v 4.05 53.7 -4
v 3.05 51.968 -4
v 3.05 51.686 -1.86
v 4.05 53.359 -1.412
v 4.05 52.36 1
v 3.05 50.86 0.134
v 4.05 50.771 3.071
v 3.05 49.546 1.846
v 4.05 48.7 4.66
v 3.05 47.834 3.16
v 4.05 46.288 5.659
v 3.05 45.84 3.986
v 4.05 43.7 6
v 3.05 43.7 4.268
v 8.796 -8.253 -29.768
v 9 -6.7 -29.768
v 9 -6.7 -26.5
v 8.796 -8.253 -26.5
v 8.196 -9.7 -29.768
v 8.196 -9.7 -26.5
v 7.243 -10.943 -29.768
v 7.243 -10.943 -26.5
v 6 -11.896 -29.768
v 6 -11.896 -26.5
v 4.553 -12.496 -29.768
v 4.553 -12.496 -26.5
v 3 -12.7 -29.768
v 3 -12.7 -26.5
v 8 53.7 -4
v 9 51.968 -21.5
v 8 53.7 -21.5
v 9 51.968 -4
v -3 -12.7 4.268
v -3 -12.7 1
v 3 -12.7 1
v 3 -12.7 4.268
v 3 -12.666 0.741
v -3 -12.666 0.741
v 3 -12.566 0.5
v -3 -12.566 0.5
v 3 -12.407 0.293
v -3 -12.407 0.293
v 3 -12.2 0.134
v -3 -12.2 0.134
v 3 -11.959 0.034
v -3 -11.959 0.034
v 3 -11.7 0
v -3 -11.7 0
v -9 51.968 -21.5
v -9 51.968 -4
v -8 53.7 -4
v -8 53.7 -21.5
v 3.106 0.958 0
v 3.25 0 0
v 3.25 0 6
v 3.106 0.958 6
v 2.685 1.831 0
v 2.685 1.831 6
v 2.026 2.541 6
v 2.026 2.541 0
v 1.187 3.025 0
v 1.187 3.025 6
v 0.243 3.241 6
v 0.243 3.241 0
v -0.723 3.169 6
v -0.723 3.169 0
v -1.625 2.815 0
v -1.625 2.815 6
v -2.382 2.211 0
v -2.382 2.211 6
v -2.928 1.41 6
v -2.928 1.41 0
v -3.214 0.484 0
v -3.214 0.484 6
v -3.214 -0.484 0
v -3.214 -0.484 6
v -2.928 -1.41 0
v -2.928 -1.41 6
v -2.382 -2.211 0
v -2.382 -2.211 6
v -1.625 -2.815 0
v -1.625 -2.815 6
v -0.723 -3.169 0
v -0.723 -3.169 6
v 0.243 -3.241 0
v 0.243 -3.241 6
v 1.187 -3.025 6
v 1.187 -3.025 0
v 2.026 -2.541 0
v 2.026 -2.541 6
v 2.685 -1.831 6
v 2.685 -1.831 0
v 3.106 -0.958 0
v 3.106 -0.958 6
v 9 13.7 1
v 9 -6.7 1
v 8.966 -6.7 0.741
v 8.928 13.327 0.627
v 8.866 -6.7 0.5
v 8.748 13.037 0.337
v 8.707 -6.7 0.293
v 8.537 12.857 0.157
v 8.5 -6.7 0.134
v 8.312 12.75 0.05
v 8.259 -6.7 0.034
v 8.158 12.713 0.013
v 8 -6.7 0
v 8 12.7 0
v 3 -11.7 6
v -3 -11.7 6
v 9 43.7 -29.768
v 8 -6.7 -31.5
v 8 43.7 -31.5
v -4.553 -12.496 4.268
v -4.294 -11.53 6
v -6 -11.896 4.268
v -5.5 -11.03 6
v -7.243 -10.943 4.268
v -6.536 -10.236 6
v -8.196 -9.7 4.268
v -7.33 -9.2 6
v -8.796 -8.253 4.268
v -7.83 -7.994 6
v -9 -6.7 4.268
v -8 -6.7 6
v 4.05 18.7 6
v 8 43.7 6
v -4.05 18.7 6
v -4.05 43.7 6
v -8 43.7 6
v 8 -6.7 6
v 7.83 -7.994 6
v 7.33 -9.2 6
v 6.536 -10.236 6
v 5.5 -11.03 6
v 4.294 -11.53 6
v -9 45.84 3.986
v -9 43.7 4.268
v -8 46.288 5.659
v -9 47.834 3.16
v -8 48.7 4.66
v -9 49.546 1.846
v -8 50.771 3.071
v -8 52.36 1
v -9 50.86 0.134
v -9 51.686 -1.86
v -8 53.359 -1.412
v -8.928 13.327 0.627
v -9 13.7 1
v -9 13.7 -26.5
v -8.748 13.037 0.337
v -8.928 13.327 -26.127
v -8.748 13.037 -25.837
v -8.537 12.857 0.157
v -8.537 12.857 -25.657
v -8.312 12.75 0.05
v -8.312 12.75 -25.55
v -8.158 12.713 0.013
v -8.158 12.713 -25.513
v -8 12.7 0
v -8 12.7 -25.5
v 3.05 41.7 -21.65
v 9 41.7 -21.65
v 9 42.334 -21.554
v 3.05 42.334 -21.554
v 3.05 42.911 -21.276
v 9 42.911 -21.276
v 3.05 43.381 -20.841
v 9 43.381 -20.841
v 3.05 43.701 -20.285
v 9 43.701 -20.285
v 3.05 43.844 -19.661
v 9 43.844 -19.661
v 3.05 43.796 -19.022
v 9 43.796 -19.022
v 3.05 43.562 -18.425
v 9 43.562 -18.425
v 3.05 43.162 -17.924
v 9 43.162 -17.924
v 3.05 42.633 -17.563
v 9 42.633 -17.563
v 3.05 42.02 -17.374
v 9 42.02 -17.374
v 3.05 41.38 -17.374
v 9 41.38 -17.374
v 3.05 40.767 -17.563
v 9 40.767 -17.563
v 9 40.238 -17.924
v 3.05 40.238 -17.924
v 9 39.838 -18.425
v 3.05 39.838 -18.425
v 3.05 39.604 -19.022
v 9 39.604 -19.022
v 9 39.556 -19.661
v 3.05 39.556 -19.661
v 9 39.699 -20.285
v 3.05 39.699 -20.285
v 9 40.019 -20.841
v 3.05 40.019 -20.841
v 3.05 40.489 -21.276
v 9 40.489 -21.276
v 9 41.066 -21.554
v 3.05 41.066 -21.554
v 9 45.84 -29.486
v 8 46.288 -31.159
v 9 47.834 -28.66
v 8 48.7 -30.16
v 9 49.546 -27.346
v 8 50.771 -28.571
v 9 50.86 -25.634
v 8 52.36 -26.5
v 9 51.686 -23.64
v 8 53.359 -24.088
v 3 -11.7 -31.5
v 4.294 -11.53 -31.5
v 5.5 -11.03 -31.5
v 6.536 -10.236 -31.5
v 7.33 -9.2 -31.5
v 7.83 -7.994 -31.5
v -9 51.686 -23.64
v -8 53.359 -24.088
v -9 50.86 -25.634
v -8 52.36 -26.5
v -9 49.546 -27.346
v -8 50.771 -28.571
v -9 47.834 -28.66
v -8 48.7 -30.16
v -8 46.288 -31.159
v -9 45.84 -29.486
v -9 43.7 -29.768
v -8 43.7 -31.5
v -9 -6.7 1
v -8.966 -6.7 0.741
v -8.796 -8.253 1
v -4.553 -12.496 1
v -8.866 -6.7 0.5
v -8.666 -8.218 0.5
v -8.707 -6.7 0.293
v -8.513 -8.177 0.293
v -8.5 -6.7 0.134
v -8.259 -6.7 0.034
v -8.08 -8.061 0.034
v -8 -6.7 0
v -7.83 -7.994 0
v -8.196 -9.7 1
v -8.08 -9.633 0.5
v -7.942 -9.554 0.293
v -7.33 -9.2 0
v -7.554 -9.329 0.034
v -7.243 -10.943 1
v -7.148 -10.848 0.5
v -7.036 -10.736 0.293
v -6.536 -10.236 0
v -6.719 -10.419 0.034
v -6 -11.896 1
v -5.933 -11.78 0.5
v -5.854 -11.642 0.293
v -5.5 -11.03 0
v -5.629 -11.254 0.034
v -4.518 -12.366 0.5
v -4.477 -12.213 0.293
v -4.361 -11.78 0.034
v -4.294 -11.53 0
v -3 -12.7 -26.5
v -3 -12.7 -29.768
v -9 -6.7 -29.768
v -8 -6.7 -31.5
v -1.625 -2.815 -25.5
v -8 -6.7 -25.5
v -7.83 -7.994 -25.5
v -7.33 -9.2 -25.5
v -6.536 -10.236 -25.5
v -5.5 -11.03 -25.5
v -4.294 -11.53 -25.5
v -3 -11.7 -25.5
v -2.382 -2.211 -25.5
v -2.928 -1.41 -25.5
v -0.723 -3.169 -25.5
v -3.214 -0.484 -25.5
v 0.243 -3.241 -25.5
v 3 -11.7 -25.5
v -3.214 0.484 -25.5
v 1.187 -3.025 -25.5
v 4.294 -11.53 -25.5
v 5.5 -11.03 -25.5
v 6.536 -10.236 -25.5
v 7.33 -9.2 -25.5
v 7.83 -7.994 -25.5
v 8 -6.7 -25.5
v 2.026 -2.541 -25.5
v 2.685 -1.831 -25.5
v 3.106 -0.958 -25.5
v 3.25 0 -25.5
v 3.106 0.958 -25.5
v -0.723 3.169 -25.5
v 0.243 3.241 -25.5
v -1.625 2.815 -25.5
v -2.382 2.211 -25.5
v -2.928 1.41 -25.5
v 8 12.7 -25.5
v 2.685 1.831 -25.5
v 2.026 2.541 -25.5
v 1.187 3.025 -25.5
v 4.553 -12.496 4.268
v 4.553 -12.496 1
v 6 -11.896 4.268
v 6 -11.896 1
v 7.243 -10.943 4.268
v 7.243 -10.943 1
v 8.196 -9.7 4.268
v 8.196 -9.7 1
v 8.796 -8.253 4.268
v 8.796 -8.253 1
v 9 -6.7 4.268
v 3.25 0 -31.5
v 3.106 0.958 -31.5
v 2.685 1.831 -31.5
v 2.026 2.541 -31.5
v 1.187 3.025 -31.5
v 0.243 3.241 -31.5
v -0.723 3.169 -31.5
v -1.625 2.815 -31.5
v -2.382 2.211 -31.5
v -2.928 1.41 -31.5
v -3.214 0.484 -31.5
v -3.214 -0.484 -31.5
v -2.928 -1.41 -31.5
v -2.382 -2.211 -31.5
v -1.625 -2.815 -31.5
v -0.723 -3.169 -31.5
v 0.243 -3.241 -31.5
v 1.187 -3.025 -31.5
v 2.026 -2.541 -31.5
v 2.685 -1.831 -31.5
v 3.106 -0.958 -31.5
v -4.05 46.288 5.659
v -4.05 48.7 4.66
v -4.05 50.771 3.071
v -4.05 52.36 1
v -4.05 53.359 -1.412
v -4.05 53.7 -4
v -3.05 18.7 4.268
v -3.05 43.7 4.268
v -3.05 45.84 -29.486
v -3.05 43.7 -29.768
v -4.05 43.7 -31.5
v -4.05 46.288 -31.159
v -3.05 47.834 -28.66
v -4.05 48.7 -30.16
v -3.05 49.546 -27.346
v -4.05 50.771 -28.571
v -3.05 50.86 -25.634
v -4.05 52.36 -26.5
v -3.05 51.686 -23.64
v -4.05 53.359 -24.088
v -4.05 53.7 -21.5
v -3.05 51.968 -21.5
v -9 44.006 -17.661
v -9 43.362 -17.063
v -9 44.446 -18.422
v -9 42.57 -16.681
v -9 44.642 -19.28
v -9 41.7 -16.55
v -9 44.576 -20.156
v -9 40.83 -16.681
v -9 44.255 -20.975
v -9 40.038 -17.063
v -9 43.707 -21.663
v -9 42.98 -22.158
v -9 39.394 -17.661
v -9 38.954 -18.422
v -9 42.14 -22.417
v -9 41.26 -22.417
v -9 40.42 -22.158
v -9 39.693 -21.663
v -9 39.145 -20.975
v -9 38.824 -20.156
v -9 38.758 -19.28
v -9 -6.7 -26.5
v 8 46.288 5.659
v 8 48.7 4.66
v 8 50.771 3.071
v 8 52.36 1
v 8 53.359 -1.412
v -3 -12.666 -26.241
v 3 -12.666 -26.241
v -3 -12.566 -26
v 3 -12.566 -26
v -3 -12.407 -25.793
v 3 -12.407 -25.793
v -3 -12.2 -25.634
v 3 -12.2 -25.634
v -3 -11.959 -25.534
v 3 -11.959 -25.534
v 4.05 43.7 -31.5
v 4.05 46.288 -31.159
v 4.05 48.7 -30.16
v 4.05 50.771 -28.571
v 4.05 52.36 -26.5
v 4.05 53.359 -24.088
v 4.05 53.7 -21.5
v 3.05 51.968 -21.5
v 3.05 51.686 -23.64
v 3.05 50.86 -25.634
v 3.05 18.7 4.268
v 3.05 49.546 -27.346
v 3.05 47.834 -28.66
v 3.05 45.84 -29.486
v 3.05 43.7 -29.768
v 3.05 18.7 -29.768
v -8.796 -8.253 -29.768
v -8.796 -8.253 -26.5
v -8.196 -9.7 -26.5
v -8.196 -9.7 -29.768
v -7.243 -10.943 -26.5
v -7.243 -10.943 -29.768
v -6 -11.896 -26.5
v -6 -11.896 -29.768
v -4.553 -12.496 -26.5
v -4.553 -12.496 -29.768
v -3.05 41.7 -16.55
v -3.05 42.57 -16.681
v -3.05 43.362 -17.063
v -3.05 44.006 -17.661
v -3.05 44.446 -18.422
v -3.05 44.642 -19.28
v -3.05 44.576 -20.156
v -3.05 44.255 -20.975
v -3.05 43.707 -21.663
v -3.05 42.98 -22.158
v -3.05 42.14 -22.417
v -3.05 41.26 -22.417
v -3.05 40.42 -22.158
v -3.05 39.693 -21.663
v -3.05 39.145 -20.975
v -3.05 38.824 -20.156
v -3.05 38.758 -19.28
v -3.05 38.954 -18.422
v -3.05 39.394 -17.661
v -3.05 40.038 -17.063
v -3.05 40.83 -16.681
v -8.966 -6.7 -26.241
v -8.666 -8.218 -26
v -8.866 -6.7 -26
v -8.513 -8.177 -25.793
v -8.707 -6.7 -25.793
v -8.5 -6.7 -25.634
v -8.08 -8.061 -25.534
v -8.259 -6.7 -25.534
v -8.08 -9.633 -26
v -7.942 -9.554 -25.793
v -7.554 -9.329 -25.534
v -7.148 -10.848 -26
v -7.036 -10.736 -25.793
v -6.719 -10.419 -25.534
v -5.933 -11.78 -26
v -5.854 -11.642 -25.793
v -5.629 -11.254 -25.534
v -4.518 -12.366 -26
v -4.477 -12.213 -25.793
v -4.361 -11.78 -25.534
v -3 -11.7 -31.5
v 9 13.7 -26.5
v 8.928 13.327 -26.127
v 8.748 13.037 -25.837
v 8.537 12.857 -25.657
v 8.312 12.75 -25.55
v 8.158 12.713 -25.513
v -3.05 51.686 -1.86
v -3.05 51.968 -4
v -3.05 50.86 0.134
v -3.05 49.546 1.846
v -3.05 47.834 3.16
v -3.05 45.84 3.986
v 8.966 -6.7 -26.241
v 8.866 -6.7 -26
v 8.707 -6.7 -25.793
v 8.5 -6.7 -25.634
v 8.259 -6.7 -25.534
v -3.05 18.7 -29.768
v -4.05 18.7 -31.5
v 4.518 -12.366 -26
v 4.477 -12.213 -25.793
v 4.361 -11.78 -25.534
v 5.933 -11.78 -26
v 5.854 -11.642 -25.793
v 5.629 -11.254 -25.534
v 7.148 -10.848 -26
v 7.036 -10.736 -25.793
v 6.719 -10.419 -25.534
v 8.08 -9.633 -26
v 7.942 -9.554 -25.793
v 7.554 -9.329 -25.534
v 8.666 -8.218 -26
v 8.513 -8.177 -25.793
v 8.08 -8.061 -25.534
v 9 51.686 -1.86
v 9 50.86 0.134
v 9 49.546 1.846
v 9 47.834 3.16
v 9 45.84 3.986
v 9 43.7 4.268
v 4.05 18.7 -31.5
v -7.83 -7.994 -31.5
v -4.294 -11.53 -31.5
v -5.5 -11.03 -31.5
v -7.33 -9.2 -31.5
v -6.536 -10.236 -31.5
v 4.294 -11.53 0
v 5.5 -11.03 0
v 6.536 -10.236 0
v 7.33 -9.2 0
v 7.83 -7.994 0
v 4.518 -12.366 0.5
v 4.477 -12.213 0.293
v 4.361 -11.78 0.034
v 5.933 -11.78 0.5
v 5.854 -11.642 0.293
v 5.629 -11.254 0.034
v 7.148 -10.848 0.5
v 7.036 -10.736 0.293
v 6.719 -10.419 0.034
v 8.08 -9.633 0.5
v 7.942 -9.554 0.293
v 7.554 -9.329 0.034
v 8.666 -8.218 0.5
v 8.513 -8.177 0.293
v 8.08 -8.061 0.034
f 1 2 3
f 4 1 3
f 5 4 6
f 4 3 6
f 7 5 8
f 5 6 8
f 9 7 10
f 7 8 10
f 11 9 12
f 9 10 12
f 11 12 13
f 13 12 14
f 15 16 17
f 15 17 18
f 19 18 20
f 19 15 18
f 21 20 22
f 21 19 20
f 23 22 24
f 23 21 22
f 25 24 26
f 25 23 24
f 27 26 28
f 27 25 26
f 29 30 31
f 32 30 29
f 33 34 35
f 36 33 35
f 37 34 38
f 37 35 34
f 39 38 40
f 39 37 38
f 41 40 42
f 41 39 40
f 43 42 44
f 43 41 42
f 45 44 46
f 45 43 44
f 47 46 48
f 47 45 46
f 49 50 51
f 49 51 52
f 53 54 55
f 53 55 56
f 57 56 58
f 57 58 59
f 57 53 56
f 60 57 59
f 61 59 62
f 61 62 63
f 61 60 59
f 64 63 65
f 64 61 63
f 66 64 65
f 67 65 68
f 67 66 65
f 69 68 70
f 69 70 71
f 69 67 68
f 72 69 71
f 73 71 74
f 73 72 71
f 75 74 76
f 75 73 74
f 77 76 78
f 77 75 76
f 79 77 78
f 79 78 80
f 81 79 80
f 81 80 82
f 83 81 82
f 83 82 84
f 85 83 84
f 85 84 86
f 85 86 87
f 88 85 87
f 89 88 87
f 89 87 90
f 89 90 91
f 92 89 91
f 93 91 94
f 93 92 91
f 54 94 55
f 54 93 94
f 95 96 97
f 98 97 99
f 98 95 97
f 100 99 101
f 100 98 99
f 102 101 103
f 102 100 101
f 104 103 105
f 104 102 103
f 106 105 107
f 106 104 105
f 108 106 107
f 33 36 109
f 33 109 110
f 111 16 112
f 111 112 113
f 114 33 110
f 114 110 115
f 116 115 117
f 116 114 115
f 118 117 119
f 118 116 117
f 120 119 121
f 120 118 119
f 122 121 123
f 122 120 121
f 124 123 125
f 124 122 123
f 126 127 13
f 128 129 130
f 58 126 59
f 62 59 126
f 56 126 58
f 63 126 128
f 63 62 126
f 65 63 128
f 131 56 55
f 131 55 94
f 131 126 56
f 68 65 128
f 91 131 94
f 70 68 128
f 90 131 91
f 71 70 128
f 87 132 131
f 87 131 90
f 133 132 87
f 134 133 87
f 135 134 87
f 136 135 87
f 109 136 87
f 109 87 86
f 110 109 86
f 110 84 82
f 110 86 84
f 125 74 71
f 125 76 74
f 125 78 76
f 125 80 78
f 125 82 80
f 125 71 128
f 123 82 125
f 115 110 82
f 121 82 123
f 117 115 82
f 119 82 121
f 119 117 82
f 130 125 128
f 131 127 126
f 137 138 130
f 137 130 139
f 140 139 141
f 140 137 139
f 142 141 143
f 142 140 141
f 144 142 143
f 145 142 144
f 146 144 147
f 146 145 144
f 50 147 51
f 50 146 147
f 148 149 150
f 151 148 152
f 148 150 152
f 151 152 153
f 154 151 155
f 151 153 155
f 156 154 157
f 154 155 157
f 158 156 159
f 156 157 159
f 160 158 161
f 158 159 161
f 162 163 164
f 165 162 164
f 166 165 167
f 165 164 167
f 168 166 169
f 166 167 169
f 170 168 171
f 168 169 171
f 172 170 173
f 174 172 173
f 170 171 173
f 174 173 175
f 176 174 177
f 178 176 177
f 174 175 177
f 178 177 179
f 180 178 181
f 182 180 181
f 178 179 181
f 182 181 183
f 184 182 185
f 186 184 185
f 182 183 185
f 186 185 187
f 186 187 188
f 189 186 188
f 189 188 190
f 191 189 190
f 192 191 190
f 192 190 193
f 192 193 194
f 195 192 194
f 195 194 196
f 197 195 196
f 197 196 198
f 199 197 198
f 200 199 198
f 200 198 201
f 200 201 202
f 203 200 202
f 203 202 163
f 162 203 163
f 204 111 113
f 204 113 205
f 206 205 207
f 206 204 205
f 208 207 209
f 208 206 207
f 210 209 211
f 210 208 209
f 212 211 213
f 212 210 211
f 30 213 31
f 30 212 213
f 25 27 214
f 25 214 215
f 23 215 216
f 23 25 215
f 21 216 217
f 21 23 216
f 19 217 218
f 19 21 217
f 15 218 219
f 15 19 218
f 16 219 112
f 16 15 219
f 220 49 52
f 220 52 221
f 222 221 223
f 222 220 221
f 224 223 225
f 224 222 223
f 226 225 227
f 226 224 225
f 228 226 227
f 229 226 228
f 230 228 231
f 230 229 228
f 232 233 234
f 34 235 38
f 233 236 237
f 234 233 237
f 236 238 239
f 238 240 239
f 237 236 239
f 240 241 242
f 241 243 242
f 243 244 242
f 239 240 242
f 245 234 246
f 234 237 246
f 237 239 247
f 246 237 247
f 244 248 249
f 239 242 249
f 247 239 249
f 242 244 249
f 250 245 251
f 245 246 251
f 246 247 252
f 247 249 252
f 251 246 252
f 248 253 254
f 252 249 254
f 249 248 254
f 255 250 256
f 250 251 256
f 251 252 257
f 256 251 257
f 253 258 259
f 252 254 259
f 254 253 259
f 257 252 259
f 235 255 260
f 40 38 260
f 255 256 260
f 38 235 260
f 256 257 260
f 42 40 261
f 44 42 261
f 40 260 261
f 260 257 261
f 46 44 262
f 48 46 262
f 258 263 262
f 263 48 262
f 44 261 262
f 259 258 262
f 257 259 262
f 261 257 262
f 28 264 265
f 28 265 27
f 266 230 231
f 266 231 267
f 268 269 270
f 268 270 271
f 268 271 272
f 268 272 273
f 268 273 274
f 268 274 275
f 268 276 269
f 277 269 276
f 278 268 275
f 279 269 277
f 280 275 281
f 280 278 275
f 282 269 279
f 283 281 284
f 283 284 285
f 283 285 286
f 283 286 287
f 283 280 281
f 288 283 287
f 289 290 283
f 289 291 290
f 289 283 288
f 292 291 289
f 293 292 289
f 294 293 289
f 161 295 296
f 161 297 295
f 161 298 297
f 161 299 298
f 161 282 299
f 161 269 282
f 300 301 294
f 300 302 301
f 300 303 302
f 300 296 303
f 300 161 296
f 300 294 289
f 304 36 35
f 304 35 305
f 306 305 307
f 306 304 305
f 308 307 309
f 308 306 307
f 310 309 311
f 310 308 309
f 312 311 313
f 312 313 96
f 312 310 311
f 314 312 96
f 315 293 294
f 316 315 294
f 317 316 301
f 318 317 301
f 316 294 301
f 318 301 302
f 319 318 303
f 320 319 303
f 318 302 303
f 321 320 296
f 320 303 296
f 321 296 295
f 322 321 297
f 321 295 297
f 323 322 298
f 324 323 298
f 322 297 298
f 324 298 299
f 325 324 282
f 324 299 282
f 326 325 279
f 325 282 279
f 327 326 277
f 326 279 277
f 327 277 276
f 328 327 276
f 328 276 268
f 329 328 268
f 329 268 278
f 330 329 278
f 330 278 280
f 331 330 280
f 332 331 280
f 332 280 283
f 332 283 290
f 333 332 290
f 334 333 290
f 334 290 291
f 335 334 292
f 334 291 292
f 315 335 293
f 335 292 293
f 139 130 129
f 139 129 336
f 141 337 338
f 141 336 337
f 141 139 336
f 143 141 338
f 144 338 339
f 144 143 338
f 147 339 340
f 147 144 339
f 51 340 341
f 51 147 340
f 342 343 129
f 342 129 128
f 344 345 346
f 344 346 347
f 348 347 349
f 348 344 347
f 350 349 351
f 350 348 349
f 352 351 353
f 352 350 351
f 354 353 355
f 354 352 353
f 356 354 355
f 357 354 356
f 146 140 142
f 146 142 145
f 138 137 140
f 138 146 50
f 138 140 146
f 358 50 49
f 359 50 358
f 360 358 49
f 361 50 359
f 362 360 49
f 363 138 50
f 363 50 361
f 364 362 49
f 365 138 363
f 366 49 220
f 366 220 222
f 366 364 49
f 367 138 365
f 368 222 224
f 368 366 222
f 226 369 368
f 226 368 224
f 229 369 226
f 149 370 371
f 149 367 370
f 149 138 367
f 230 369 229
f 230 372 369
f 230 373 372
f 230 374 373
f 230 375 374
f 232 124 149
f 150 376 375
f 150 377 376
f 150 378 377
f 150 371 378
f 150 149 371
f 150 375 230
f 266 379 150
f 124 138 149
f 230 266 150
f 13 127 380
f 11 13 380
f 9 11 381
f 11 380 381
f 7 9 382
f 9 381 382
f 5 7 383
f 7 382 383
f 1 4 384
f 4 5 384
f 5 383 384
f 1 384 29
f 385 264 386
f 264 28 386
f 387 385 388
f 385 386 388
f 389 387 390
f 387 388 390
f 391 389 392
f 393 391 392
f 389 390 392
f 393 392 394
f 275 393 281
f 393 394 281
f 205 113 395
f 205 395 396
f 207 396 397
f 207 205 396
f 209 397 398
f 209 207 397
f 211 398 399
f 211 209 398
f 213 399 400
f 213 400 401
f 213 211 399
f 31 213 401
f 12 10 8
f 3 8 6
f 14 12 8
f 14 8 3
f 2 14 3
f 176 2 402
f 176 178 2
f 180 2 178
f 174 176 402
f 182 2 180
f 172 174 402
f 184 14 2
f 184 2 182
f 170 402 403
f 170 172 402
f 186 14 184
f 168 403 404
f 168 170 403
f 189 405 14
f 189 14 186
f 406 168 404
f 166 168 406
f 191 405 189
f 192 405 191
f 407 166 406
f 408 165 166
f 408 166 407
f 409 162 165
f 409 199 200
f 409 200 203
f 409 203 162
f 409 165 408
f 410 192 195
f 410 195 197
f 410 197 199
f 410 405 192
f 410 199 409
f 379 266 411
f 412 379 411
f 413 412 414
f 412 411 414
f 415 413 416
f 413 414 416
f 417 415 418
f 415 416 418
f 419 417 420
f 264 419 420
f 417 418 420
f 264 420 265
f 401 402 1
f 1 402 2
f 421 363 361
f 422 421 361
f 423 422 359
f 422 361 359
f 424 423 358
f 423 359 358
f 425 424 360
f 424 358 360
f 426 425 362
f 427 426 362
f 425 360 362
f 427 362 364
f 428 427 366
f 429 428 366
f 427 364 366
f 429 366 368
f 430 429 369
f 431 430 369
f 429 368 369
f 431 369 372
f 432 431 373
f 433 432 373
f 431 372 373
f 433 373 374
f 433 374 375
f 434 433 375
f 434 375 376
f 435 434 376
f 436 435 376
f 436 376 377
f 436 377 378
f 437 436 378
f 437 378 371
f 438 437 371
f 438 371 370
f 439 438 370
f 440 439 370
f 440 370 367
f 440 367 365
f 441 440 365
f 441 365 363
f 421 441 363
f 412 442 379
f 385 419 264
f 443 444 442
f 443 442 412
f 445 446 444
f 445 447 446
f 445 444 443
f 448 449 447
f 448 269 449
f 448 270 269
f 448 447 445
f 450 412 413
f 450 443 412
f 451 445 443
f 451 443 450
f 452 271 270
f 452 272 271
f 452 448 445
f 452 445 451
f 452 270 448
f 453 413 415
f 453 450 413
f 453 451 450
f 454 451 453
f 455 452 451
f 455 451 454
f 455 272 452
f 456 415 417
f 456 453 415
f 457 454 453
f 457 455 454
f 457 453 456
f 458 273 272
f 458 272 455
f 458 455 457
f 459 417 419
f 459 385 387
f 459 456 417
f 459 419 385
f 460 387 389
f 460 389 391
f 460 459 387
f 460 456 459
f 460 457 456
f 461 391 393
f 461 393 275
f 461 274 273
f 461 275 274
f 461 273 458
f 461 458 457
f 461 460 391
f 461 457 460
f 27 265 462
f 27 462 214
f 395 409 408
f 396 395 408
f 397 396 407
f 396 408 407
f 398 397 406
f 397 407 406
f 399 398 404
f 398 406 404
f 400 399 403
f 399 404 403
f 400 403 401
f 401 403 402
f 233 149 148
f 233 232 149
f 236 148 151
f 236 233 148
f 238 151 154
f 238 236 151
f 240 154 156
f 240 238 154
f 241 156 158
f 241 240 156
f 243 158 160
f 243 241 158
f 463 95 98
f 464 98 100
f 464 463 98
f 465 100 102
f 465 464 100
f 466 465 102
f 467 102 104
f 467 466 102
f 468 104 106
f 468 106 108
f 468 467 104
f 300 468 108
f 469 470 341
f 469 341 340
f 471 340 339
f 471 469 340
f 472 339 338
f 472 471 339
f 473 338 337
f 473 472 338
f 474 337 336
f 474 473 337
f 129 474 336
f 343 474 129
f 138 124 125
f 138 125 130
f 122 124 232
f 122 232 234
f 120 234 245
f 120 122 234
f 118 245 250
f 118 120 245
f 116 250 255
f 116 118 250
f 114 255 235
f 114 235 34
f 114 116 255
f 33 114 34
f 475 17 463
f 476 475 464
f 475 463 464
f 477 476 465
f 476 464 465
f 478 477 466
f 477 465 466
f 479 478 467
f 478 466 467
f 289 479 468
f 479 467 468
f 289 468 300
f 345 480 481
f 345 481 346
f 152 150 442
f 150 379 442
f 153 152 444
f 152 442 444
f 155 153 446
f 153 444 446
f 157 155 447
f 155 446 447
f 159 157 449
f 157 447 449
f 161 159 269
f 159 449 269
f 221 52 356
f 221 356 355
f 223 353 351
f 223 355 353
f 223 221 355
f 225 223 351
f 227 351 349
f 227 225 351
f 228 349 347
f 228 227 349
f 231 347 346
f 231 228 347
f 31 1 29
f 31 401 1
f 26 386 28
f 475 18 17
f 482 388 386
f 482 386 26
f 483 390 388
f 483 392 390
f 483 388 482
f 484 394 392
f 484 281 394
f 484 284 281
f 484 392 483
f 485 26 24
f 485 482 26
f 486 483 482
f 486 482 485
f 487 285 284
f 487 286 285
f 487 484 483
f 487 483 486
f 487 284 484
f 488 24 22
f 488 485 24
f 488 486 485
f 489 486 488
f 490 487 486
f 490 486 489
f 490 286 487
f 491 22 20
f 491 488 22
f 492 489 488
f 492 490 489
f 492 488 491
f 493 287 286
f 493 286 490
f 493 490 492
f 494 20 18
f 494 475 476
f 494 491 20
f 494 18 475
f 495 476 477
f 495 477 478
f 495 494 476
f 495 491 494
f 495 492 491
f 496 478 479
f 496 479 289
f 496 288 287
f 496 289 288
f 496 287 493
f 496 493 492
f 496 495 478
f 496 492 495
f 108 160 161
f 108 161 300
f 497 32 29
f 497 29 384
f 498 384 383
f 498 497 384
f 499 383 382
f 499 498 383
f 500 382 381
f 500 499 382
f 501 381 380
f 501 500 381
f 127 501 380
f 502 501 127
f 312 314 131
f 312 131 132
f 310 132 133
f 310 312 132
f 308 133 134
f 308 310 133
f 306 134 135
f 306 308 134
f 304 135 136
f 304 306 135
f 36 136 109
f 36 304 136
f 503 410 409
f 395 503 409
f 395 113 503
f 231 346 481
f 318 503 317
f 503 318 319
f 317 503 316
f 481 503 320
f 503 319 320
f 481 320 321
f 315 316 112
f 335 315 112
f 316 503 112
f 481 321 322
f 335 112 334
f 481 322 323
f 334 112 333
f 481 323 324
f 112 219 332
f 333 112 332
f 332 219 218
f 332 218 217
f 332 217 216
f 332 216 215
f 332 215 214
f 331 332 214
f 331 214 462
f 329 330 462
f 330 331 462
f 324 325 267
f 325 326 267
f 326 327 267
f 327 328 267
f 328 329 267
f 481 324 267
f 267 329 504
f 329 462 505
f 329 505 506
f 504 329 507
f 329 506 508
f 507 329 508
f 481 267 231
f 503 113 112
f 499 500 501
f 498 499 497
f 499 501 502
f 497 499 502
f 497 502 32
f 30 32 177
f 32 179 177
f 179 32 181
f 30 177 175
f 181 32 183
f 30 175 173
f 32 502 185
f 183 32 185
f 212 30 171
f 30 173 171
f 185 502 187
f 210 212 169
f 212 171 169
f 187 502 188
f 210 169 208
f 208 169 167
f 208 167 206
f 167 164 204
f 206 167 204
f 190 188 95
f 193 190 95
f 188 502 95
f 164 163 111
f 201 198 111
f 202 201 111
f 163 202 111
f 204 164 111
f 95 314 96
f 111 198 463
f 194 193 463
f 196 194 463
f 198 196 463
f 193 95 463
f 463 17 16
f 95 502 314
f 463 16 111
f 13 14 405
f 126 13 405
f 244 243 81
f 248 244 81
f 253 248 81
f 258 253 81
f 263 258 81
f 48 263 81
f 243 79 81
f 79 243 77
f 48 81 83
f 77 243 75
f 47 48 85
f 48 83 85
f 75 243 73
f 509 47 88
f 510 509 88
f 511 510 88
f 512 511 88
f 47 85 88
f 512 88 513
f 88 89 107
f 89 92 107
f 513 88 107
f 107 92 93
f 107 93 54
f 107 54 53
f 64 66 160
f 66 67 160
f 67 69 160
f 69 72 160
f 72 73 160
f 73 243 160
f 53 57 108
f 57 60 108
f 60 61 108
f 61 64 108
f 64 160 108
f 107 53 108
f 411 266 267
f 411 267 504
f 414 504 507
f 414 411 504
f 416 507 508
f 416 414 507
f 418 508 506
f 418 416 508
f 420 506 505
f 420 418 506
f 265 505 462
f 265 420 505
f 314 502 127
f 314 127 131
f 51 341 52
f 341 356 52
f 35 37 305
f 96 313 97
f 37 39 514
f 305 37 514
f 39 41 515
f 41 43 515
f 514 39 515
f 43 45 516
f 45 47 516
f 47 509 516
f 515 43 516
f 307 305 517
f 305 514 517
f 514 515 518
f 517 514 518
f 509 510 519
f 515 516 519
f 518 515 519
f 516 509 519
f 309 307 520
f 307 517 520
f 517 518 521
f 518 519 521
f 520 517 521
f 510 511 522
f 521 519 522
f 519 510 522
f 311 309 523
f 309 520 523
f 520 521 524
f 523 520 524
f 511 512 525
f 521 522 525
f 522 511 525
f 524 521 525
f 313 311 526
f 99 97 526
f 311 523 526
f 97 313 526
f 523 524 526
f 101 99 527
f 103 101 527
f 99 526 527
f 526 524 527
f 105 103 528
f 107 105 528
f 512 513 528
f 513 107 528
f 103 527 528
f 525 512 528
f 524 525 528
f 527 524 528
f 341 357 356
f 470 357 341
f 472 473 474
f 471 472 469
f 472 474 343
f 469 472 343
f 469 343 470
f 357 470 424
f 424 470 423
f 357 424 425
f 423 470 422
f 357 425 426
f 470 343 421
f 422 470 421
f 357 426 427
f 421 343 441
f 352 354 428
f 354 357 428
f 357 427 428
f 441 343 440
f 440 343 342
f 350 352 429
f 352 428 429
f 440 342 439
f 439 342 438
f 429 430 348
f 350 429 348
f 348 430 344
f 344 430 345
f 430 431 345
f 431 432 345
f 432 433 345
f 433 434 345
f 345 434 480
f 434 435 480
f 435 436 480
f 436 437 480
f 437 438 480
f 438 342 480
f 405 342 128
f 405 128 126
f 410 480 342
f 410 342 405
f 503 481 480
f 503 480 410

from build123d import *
from OCP.BRepFilletAPI import BRepFilletAPI_MakeChamfer

# Parameters (mm, degrees)
SKETCH1_W           = 18
SKETCH1_H           = 25.4
SKETCH1_R           = 3.25
BOSS_EXTRUDE1_DEPTH = 6
SKETCH2_W           = 18
SKETCH2_H           = 37.5
BOSS_EXTRUDE2_DEPTH = 6
SKETCH3_W           = 5.95
SKETCH3_H           = 37.5
BOSS_EXTRUDE3_DEPTH = 35
SKETCH4_R           = 2.15
CUT_EXTRUDE1_DEPTH  = 65.806944072
CUT_EXTRUDE2_REACH  = 66.807
SKETCH5_R           = 2.95
FILLET1_R           = 10
FILLET2_R           = 6
CHAMFER1_SIZE       = 1
CHAMFER1_SIZE2      = 1.732050808
CHAMFER2_SIZE       = 1
CHAMFER2_SIZE2      = 1.732050808
FILLET3_R           = 1


with BuildPart() as part:
    # Sketch1 → Boss-Extrude1 (new body)
    with BuildSketch(Plane.XY):
        Rectangle(SKETCH1_W, SKETCH1_H)
        Circle(SKETCH1_R, mode=Mode.SUBTRACT)
    boss_extrude1 = extrude(amount=BOSS_EXTRUDE1_DEPTH)

    # Sketch2 → Boss-Extrude2 (add)
    with BuildSketch(Plane(origin=(0, 12.7, 0), x_dir=(1, 0, 0), z_dir=(0, 1, 0))):
        with Locations((0, 12.75)):
            Rectangle(SKETCH2_W, SKETCH2_H)
    extrude(amount=BOSS_EXTRUDE2_DEPTH)

    # Mirror1: Boss-Extrude1 across plane
    add(boss_extrude1.mirror(Plane.XY.offset(-12.75)))

    # Sketch3 → Boss-Extrude3 (add)
    with BuildSketch(Plane(origin=(0, 18.7, 0), x_dir=(1, 0, 0), z_dir=(0, 1, 0))):
        with Locations((6.025, 12.75)):
            Rectangle(SKETCH3_W, SKETCH3_H)
    boss_extrude3 = extrude(amount=BOSS_EXTRUDE3_DEPTH)

    # Mirror2: Boss-Extrude3 across plane
    add(boss_extrude3.mirror(Plane(origin=(0, 0, 0), x_dir=(0, 0, 1), z_dir=(1, 0, 0))))

    # Sketch4 → Cut-Extrude1 (cut, through all)
    with BuildSketch(Plane(origin=(9, 0, 0), x_dir=(0, 0, -1), z_dir=(1, 0, 0))):
        with Locations((19.5, 41.7)):
            Circle(SKETCH4_R)
    extrude(amount=-CUT_EXTRUDE1_DEPTH, mode=Mode.SUBTRACT)

    # Sketch5 → Cut-Extrude2 (cut, up to next)
    with BuildSketch(Plane.ZY.offset(9), mode=Mode.PRIVATE) as cut_extrude2_sk1:
        with Locations((-19.5, 41.7)):
            Circle(SKETCH5_R)
    cut_extrude2_tool1 = extrude(cut_extrude2_sk1.sketch, amount=-CUT_EXTRUDE2_REACH, mode=Mode.PRIVATE) & part.part
    add(cut_extrude2_tool1.solids().sort_by_distance((-9, 41.7, -19.5))[0], mode=Mode.SUBTRACT)

    # Fillet1
    fillet1_edges = [part.edges().sort_by_distance(p)[0] for p in [
        (6.025, 53.7, -31.5),
        (6.025, 53.7, 6),
        (-6.025, 53.7, 6),
        (-6.025, 53.7, -31.5),
    ]]
    fillet(fillet1_edges, radius=FILLET1_R)

    # Fillet2
    fillet2_edges = [part.edges().sort_by_distance(p)[0] for p in [
        (9, -12.7, -28.5),
        (-9, -12.7, -28.5),
        (9, -12.7, 3),
        (-9, -12.7, 3),
    ]]
    fillet(fillet2_edges, radius=FILLET2_R)

    # Chamfer1: one chamfer whose edges measure the first distance from different faces: ONE call of the kernel's chamfer builder (chamfer() names one face for all edges)
    chamfer1_edges_1 = [part.edges().sort_by_distance(p)[0] for p in [
        (-3.05, 31.2, -31.5),
        (3.05, 31.2, -31.5),
    ]]
    chamfer1_side_1 = [part.faces().sort_by_distance(p)[0] for p in [
        (0, 13.700522402, -31.5),
    ]]
    chamfer1_edges_2 = [part.edges().sort_by_distance(p)[0] for p in [
        (-3.05, 53.7, -12.75),
    ]]
    chamfer1_side_2 = [part.faces().sort_by_distance(p)[0] for p in [
        (-6.025, 53.7, -12.75),
    ]]
    chamfer1_edges_3 = [part.edges().sort_by_distance(p)[0] for p in [
        (-3.05, 31.2, 6),
        (3.05, 31.2, 6),
    ]]
    chamfer1_side_3 = [part.faces().sort_by_distance(p)[0] for p in [
        (0, 13.700522402, 6),
    ]]
    chamfer1_edges_4 = [part.edges().sort_by_distance(p)[0] for p in [
        (-3.05, 50.771067812, 3.071067812),
    ]]
    chamfer1_side_4 = [part.faces().sort_by_distance(p)[0] for p in [
        (-6.025, 50.771067812, 3.071067812),
    ]]
    chamfer1_edges_5 = [part.edges().sort_by_distance(p)[0] for p in [
        (-3.05, 50.771067812, -28.571067812),
    ]]
    chamfer1_side_5 = [part.faces().sort_by_distance(p)[0] for p in [
        (-6.025, 50.771067812, -28.571067812),
    ]]
    chamfer1_edges_6 = [part.edges().sort_by_distance(p)[0] for p in [
        (3.05, 53.7, -12.75),
    ]]
    chamfer1_side_6 = [part.faces().sort_by_distance(p)[0] for p in [
        (6.025, 53.7, -12.75),
    ]]
    chamfer1_edges_7 = [part.edges().sort_by_distance(p)[0] for p in [
        (3.05, 50.771067812, 3.071067812),
    ]]
    chamfer1_side_7 = [part.faces().sort_by_distance(p)[0] for p in [
        (6.025, 50.771067812, 3.071067812),
    ]]
    chamfer1_edges_8 = [part.edges().sort_by_distance(p)[0] for p in [
        (3.05, 50.771067812, -28.571067812),
    ]]
    chamfer1_side_8 = [part.faces().sort_by_distance(p)[0] for p in [
        (6.025, 50.771067812, -28.571067812),
    ]]
    chamfer1 = BRepFilletAPI_MakeChamfer(part.part.solid().wrapped)
    for e in chamfer1_edges_1:
        chamfer1.Add(CHAMFER1_SIZE, CHAMFER1_SIZE2, e.wrapped, chamfer1_side_1[0].wrapped)  # the first distance lies on this face
    for e in chamfer1_edges_2:
        chamfer1.Add(CHAMFER1_SIZE, CHAMFER1_SIZE2, e.wrapped, chamfer1_side_2[0].wrapped)  # the first distance lies on this face
    for e in chamfer1_edges_3:
        chamfer1.Add(CHAMFER1_SIZE, CHAMFER1_SIZE2, e.wrapped, chamfer1_side_3[0].wrapped)  # the first distance lies on this face
    for e in chamfer1_edges_4:
        chamfer1.Add(CHAMFER1_SIZE, CHAMFER1_SIZE2, e.wrapped, chamfer1_side_4[0].wrapped)  # the first distance lies on this face
    for e in chamfer1_edges_5:
        chamfer1.Add(CHAMFER1_SIZE, CHAMFER1_SIZE2, e.wrapped, chamfer1_side_5[0].wrapped)  # the first distance lies on this face
    for e in chamfer1_edges_6:
        chamfer1.Add(CHAMFER1_SIZE, CHAMFER1_SIZE2, e.wrapped, chamfer1_side_6[0].wrapped)  # the first distance lies on this face
    for e in chamfer1_edges_7:
        chamfer1.Add(CHAMFER1_SIZE, CHAMFER1_SIZE2, e.wrapped, chamfer1_side_7[0].wrapped)  # the first distance lies on this face
    for e in chamfer1_edges_8:
        chamfer1.Add(CHAMFER1_SIZE, CHAMFER1_SIZE2, e.wrapped, chamfer1_side_8[0].wrapped)  # the first distance lies on this face
    add(Compound.cast(chamfer1.Shape()), mode=Mode.REPLACE)

    # Chamfer2: one chamfer whose edges measure the first distance from different faces: ONE call of the kernel's chamfer builder (chamfer() names one face for all edges)
    chamfer2_edges_1 = [part.edges().sort_by_distance(p)[0] for p in [
        (0, -12.7, -31.5),
        (7.242640687, -10.942640687, -31.5),
        (-7.242640687, -10.942640687, -31.5),
        (9, 18.5, -31.5),
        (-9, 18.5, -31.5),
    ]]
    chamfer2_side_1 = [part.faces().sort_by_distance(p)[0] for p in [
        (0, 12.555366953, -31.5),
    ]]
    chamfer2_edges_2 = [part.edges().sort_by_distance(p)[0] for p in [
        (9, 18.5, 6),
        (0, -12.7, 6),
        (7.242640687, -10.942640687, 6),
        (-7.242640687, -10.942640687, 6),
        (-9, 18.5, 6),
    ]]
    chamfer2_side_2 = [part.faces().sort_by_distance(p)[0] for p in [
        (0, 12.555366953, 6),
    ]]
    chamfer2_edges_3 = [part.edges().sort_by_distance(p)[0] for p in [
        (-9, 53.7, -12.75),
    ]]
    chamfer2_side_3 = [part.faces().sort_by_distance(p)[0] for p in [
        (-6.525, 53.7, -12.75),
    ]]
    chamfer2_edges_4 = [part.edges().sort_by_distance(p)[0] for p in [
        (-9, 50.771067812, 3.071067812),
    ]]
    chamfer2_side_4 = [part.faces().sort_by_distance(p)[0] for p in [
        (-6.525, 50.771067812, 3.071067812),
    ]]
    chamfer2_edges_5 = [part.edges().sort_by_distance(p)[0] for p in [
        (-9, 50.771067812, -28.571067812),
    ]]
    chamfer2_side_5 = [part.faces().sort_by_distance(p)[0] for p in [
        (-6.525, 50.771067812, -28.571067812),
    ]]
    chamfer2_edges_6 = [part.edges().sort_by_distance(p)[0] for p in [
        (9, 53.7, -12.75),
    ]]
    chamfer2_side_6 = [part.faces().sort_by_distance(p)[0] for p in [
        (6.525, 53.7, -12.75),
    ]]
    chamfer2_edges_7 = [part.edges().sort_by_distance(p)[0] for p in [
        (9, 50.771067812, 3.071067812),
    ]]
    chamfer2_side_7 = [part.faces().sort_by_distance(p)[0] for p in [
        (6.525, 50.771067812, 3.071067812),
    ]]
    chamfer2_edges_8 = [part.edges().sort_by_distance(p)[0] for p in [
        (9, 50.771067812, -28.571067812),
    ]]
    chamfer2_side_8 = [part.faces().sort_by_distance(p)[0] for p in [
        (6.525, 50.771067812, -28.571067812),
    ]]
    chamfer2 = BRepFilletAPI_MakeChamfer(part.part.solid().wrapped)
    for e in chamfer2_edges_1:
        chamfer2.Add(CHAMFER2_SIZE, CHAMFER2_SIZE2, e.wrapped, chamfer2_side_1[0].wrapped)  # the first distance lies on this face
    for e in chamfer2_edges_2:
        chamfer2.Add(CHAMFER2_SIZE, CHAMFER2_SIZE2, e.wrapped, chamfer2_side_2[0].wrapped)  # the first distance lies on this face
    for e in chamfer2_edges_3:
        chamfer2.Add(CHAMFER2_SIZE, CHAMFER2_SIZE2, e.wrapped, chamfer2_side_3[0].wrapped)  # the first distance lies on this face
    for e in chamfer2_edges_4:
        chamfer2.Add(CHAMFER2_SIZE, CHAMFER2_SIZE2, e.wrapped, chamfer2_side_4[0].wrapped)  # the first distance lies on this face
    for e in chamfer2_edges_5:
        chamfer2.Add(CHAMFER2_SIZE, CHAMFER2_SIZE2, e.wrapped, chamfer2_side_5[0].wrapped)  # the first distance lies on this face
    for e in chamfer2_edges_6:
        chamfer2.Add(CHAMFER2_SIZE, CHAMFER2_SIZE2, e.wrapped, chamfer2_side_6[0].wrapped)  # the first distance lies on this face
    for e in chamfer2_edges_7:
        chamfer2.Add(CHAMFER2_SIZE, CHAMFER2_SIZE2, e.wrapped, chamfer2_side_7[0].wrapped)  # the first distance lies on this face
    for e in chamfer2_edges_8:
        chamfer2.Add(CHAMFER2_SIZE, CHAMFER2_SIZE2, e.wrapped, chamfer2_side_8[0].wrapped)  # the first distance lies on this face
    add(Compound.cast(chamfer2.Shape()), mode=Mode.REPLACE)

    # Fillet3
    fillet3_edges = [part.edges().sort_by_distance(p)[0] for p in [
        (9, 3, -25.5),
        (0, -12.7, -25.5),
        (7.242640687, -10.942640687, -25.5),
        (-7.242640687, -10.942640687, -25.5),
        (9, 3, 0),
        (0, -12.7, 0),
        (7.242640687, -10.942640687, 0),
        (-7.242640687, -10.942640687, 0),
        (9, 12.7, -12.75),
        (-9, 12.7, -12.75),
        (-9, 3, -25.5),
        (-9, 3, 0),
    ]]
    fillet(fillet3_edges, radius=FILLET3_R)


solid = part.part
